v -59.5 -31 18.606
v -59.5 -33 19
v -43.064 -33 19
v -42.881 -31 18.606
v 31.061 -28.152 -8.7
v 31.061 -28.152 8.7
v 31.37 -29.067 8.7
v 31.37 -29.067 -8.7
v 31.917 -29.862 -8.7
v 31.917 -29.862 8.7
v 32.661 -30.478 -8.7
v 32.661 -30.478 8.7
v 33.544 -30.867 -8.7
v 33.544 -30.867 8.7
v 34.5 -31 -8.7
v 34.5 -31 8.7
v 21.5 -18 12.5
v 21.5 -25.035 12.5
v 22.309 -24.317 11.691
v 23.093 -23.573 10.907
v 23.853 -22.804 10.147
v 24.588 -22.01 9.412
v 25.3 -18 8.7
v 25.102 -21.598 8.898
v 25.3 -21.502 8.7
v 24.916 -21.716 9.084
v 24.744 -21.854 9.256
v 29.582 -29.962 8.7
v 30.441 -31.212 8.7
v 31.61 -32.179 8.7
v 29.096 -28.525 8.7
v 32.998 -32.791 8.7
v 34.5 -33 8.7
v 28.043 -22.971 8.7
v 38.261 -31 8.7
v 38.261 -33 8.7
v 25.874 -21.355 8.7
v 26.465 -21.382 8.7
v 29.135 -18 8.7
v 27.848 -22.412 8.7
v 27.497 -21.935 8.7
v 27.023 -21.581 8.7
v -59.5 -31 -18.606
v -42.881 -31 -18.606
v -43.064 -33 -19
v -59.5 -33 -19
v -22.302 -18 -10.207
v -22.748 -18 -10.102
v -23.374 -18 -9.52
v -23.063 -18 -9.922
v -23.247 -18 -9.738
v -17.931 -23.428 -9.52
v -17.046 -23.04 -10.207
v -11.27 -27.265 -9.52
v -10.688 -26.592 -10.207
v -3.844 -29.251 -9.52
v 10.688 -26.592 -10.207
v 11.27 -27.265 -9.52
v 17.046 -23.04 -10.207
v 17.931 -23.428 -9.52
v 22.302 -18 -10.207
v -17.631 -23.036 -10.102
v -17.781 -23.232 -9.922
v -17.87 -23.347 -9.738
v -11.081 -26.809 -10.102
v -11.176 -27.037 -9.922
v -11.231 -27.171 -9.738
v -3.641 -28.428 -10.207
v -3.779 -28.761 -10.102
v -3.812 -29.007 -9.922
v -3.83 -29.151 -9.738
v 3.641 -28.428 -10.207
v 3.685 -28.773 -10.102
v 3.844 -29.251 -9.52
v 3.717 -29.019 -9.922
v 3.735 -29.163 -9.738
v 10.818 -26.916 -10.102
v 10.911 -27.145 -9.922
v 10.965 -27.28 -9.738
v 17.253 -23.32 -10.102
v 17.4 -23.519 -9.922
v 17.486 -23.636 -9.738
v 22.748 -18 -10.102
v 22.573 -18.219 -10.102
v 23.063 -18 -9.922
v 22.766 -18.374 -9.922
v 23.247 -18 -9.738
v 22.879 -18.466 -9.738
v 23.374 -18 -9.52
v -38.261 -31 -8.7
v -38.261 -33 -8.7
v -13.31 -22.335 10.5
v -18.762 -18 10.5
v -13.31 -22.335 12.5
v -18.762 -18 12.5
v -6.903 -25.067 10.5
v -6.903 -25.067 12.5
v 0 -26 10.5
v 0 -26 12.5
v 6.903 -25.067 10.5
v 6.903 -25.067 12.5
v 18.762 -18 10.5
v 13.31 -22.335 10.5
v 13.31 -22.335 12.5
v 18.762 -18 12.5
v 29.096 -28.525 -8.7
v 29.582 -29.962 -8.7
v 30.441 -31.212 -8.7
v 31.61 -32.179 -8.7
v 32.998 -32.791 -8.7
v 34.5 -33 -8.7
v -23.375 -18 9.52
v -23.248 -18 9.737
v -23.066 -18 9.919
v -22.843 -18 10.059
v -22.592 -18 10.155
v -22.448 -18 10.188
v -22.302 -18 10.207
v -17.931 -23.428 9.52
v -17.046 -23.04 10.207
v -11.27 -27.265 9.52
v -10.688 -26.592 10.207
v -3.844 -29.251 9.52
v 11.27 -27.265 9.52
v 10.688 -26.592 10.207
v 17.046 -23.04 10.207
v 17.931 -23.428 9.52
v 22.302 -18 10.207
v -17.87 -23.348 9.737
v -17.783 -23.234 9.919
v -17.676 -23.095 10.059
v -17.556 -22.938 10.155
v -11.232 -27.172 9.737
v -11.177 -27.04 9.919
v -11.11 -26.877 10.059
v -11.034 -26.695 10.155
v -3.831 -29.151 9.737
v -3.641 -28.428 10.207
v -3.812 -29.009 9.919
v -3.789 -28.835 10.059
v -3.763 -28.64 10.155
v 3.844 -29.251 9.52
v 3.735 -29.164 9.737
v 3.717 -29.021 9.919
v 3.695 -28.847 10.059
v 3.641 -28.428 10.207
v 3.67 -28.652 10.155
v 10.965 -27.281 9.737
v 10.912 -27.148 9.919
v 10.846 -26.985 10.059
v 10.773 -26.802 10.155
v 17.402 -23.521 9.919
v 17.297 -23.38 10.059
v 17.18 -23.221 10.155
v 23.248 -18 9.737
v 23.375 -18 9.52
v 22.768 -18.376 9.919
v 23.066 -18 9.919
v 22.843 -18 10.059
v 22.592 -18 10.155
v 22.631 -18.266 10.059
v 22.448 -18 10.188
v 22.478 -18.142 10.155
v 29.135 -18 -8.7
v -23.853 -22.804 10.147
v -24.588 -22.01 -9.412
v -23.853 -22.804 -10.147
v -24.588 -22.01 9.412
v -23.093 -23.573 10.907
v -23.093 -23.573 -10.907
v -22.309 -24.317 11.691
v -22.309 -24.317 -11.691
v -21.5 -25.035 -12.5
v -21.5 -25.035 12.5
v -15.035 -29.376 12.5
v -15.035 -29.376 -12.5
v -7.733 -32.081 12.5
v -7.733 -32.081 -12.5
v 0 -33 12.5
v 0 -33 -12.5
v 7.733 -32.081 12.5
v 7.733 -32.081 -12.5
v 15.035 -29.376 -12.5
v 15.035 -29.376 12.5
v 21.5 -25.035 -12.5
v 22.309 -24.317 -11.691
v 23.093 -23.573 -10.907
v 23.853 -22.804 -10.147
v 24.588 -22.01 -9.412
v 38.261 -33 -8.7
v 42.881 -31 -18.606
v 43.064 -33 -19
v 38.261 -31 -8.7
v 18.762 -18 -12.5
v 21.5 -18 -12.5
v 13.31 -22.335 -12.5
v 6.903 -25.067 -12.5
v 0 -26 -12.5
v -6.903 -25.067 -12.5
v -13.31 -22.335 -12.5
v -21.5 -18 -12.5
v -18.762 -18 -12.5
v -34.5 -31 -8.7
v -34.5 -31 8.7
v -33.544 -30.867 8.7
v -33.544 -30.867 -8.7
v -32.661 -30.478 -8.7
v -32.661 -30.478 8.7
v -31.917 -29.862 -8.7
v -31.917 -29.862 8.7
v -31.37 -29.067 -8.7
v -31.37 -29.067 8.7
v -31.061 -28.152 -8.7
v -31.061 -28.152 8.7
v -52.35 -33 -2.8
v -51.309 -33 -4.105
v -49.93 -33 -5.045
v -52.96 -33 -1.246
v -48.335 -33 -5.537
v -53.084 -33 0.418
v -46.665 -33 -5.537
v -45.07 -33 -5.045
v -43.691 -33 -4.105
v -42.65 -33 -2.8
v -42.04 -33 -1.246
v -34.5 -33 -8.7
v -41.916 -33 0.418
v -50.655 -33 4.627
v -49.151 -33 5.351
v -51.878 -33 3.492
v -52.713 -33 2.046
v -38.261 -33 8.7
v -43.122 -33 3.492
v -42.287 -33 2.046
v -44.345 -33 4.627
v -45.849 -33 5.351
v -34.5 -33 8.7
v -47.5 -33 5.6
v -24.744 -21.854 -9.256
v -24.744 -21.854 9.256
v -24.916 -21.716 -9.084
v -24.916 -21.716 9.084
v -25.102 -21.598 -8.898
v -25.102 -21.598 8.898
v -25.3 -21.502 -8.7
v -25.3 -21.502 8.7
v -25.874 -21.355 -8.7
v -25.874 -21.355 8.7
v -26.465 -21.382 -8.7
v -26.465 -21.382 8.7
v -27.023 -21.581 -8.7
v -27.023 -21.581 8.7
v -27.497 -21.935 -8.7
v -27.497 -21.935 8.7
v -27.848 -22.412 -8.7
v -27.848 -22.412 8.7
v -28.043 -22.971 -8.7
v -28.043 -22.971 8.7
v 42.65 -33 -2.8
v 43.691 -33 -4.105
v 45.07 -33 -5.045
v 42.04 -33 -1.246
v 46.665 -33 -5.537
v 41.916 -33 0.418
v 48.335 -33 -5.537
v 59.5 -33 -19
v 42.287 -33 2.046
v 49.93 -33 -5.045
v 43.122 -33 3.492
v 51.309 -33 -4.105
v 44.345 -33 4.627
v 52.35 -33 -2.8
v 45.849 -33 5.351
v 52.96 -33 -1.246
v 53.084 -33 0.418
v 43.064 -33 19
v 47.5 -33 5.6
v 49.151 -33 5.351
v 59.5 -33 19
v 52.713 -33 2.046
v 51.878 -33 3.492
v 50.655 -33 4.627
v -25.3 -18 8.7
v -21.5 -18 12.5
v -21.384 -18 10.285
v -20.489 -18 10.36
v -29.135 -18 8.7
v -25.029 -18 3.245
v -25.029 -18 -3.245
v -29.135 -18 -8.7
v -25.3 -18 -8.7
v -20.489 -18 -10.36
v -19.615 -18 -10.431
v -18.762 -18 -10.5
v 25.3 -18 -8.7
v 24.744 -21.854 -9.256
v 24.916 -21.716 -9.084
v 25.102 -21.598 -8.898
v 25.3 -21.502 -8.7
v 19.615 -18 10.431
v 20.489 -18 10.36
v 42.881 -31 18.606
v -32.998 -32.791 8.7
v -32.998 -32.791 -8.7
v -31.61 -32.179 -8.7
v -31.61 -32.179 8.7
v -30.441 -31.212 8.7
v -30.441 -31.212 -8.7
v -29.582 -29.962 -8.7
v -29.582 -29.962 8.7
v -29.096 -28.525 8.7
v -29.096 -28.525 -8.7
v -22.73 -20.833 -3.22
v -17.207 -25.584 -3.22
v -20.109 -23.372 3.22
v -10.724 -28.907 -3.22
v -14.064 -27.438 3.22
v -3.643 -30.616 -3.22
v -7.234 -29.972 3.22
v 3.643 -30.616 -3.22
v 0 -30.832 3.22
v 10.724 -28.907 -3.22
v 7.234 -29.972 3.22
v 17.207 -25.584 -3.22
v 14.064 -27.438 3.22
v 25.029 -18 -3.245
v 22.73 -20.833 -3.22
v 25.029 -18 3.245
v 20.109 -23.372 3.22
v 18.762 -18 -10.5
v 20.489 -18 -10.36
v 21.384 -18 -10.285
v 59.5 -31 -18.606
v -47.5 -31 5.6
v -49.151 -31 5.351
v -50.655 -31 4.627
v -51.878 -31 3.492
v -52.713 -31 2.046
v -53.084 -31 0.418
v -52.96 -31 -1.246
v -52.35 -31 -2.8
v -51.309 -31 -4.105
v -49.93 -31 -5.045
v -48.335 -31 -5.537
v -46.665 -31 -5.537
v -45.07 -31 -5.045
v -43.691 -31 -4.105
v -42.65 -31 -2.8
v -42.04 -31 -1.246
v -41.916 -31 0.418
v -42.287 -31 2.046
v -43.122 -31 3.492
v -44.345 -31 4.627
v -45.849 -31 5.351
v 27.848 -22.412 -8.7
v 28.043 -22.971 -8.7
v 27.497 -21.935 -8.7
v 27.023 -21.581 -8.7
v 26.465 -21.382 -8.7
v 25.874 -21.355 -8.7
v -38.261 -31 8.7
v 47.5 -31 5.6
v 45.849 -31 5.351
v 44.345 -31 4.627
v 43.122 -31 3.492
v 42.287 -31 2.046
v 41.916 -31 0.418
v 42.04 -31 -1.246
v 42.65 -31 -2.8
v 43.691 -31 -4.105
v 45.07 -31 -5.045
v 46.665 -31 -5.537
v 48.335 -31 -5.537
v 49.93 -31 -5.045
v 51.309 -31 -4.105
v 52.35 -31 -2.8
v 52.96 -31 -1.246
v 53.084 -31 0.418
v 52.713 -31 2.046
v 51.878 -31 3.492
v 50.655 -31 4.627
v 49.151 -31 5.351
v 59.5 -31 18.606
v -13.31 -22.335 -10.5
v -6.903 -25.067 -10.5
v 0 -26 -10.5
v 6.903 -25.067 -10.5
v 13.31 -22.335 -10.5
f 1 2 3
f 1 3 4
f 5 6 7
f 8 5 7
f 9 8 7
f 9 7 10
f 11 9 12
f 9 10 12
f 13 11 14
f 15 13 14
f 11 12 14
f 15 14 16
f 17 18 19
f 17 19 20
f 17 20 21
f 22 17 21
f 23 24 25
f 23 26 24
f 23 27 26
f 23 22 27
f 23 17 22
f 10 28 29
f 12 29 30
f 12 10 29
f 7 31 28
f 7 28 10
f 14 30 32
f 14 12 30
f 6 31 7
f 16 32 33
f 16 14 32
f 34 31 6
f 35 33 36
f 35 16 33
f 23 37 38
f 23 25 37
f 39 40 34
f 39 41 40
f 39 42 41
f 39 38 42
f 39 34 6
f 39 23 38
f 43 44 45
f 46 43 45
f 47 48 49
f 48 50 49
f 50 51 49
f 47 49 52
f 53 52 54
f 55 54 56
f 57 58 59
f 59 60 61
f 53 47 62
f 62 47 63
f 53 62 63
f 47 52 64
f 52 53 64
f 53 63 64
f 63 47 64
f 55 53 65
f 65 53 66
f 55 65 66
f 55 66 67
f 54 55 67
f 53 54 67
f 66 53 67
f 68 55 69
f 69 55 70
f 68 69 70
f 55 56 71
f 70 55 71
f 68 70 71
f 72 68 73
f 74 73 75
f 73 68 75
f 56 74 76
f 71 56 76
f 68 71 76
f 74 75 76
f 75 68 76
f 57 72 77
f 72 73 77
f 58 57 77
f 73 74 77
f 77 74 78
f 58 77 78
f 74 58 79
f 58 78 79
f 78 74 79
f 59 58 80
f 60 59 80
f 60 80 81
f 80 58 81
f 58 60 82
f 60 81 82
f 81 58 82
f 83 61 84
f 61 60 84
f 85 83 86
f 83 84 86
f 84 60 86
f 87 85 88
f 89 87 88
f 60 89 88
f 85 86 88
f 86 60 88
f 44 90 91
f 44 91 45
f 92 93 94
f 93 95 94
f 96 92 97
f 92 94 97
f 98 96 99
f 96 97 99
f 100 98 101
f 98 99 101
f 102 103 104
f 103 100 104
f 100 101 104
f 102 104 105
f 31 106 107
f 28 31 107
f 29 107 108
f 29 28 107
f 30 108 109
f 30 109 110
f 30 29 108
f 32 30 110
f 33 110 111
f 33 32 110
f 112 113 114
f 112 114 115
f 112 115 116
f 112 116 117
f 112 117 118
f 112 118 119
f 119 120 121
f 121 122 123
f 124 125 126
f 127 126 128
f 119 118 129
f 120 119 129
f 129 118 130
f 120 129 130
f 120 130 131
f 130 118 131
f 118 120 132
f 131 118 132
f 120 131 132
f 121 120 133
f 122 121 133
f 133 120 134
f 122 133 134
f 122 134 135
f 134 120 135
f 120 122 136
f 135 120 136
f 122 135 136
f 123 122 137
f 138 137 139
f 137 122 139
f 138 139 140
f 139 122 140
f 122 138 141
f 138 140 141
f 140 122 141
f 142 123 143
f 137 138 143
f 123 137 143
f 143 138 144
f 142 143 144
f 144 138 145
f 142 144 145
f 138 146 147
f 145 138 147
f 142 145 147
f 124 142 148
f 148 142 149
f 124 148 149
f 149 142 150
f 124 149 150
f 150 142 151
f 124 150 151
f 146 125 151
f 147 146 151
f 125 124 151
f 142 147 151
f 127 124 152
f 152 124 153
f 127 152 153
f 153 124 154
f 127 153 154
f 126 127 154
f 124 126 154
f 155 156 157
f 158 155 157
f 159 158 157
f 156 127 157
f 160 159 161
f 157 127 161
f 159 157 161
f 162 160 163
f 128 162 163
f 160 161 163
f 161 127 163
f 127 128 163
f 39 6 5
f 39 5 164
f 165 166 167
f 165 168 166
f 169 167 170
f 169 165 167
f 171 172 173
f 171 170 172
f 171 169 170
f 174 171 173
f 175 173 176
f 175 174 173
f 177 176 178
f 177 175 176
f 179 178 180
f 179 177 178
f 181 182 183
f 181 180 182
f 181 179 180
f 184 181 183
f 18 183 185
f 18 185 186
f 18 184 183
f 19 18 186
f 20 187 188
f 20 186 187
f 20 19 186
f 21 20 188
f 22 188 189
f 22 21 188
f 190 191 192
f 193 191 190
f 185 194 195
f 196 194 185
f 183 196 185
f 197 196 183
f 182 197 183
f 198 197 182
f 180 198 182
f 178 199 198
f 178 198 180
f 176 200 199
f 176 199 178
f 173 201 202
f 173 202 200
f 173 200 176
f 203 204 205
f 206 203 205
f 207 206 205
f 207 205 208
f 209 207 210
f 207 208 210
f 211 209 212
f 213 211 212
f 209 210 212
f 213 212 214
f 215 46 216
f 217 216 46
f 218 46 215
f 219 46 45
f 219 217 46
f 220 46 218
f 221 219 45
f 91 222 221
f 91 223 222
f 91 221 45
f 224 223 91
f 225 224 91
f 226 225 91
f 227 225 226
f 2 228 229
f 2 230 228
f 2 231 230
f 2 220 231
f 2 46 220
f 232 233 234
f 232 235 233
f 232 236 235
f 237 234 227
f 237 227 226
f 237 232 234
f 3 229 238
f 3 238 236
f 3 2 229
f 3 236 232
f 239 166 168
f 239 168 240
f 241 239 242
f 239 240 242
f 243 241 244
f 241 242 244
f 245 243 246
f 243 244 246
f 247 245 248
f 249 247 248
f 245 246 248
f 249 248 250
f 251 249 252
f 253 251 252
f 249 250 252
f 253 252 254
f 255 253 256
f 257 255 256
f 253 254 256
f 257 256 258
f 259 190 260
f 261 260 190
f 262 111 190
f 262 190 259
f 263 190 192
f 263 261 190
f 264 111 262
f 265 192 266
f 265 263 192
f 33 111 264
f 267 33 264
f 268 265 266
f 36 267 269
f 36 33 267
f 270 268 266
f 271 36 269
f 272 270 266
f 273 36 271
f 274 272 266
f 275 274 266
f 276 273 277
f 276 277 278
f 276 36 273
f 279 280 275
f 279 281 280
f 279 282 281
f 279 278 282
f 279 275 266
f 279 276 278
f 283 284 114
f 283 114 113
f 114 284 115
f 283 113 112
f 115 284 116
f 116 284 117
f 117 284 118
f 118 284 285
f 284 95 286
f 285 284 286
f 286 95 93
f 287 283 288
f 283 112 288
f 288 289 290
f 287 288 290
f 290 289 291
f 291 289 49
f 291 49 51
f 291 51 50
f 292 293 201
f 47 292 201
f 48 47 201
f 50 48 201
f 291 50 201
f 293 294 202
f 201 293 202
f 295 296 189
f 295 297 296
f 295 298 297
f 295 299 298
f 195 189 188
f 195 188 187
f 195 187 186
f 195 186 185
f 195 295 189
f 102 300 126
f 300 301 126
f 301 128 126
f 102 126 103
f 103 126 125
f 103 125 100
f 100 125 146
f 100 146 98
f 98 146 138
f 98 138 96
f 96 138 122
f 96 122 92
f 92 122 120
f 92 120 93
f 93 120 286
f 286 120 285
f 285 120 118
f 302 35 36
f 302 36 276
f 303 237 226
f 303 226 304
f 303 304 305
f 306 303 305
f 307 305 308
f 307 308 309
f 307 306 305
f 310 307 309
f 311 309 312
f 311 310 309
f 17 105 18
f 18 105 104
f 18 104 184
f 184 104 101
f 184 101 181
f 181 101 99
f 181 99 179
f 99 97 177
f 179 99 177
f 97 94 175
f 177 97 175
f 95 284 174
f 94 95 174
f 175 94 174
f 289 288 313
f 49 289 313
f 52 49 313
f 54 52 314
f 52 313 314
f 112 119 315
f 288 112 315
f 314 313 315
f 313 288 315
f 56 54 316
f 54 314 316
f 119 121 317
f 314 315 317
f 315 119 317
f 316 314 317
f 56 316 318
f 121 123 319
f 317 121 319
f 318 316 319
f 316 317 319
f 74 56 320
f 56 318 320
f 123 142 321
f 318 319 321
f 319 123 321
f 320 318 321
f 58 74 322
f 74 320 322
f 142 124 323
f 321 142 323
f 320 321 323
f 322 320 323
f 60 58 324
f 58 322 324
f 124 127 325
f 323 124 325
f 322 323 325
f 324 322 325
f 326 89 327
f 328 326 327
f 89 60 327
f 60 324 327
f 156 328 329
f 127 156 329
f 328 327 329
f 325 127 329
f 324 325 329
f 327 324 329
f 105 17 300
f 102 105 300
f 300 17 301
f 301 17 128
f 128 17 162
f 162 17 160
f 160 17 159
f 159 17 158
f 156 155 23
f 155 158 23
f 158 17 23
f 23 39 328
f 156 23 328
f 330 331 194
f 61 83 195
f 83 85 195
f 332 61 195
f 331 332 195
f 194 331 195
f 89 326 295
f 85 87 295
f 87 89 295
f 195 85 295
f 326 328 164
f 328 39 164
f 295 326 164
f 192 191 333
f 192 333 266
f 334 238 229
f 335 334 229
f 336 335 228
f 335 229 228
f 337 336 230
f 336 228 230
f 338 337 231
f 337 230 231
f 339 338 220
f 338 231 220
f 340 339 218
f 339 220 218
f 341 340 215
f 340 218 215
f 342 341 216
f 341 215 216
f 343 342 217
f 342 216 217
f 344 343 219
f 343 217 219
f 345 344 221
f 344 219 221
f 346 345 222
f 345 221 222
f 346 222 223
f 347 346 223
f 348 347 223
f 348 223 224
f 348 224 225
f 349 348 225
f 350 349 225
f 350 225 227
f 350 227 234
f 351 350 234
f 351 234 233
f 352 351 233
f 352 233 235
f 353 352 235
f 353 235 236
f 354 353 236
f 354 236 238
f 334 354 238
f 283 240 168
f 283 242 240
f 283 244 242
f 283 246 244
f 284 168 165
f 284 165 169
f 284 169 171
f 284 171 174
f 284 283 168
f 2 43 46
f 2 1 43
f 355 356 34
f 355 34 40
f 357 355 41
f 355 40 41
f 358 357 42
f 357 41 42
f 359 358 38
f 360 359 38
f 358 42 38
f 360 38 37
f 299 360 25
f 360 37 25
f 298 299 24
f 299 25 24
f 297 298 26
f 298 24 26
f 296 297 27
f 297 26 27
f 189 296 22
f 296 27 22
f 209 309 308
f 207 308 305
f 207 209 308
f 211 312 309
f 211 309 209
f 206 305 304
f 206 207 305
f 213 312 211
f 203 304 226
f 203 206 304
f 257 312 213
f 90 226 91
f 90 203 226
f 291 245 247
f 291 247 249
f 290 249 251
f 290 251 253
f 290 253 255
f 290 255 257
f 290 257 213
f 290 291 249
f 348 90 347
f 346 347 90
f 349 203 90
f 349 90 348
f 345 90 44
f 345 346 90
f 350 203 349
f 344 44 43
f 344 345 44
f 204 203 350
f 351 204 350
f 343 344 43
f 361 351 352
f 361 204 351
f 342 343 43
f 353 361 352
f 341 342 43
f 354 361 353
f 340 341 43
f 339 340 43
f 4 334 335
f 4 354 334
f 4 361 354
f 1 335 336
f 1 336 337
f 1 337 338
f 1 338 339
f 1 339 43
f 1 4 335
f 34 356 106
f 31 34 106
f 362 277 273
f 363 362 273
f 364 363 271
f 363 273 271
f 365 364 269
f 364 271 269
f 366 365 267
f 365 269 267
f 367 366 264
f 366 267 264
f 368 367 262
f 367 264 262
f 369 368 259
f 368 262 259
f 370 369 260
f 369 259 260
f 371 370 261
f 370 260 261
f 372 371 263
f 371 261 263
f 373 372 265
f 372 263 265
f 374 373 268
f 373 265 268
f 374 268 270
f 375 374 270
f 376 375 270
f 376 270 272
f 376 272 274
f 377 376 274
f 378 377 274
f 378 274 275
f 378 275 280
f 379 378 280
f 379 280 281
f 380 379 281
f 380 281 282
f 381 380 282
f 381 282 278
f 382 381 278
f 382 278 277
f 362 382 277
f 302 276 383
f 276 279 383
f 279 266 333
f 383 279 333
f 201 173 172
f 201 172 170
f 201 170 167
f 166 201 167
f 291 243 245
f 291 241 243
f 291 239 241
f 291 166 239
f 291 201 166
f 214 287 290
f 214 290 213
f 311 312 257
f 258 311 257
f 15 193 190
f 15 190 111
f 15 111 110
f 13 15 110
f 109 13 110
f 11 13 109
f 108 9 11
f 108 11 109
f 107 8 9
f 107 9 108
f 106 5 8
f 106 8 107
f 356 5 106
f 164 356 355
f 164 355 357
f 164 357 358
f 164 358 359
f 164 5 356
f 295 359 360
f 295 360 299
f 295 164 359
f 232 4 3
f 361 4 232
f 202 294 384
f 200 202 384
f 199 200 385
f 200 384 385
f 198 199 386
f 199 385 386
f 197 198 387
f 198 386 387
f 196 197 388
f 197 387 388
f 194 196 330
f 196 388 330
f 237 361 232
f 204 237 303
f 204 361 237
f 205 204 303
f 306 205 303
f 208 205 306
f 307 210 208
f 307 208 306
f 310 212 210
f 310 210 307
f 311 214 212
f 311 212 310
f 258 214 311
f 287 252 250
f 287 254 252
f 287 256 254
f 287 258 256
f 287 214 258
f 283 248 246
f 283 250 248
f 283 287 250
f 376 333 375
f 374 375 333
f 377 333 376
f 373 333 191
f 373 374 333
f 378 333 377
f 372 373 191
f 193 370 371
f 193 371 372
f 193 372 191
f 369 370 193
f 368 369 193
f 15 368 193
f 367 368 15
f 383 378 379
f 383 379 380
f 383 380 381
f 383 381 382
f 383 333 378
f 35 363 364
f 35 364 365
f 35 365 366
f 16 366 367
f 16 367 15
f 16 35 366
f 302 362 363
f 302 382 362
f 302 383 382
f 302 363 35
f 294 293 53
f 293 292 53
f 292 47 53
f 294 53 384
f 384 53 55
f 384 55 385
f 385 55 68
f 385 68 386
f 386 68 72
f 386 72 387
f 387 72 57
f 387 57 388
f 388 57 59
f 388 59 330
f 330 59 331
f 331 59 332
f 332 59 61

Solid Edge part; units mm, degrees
sketch "Sketch1" plane through (0, 0, 0) normal (0, 0, 1) x (1, 0, 0)
  line L0 (-59.5, -31) -> (-59.5, -33)
  line L1 (-59.5, -33) -> (-34.5, -33)
  arc A0 (-34.5, -33) -> (-29.0964, -28.5251) centre (-34.5, -27.5) ccw
  line L2 (-29.0964, -28.5251) -> (-28.0428, -22.9713)
  arc A1 (-28.0428, -22.9713) -> (-24.5877, -22.0101) centre (-26.0779, -23.3441) cw
  arc A2 (-24.5877, -22.0101) -> (24.5877, -22.0101) centre (0, 0) ccw
  arc A3 (24.5877, -22.0101) -> (28.0428, -22.9713) centre (26.0779, -23.3441) cw
  line L3 (28.0428, -22.9713) -> (29.0964, -28.5251)
  arc A4 (29.0964, -28.5251) -> (34.5, -33) centre (34.5, -27.5) ccw
  line L4 (34.5, -33) -> (59.5, -33)
  line L5 (59.5, -33) -> (59.5, -31)
  line L6 (59.5, -31) -> (34.5, -31)
  arc A5 (34.5, -31) -> (31.0613, -28.1523) centre (34.5, -27.5) cw
  line L7 (31.0613, -28.1523) -> (28.2379, -13.2688)
  arc A6 (28.2379, -13.2688) -> (-28.2379, -13.2688) centre (0, 0) cw
  line L8 (-28.2379, -13.2688) -> (-31.0613, -28.1523)
  arc A7 (-31.0613, -28.1523) -> (-34.5, -31) centre (-34.5, -27.5) cw
  line L9 (-34.5, -31) -> (-59.5, -31)
extrude "ExtrudedProtrusion_1" add sketch "Sketch1" against normal blind 19 and the other way blind 19
sketch "Sketch2" plane through (0, 0, 0) normal (1, 0, 0) x (0, 1, 0)
  line L0 (-33, 19) -> (0, 12.5)
  line L1 (0, 12.5) -> (33, 12.5)
  line L2 (33, 12.5) -> (33, -12.5)
  line L3 (33, -12.5) -> (0, -12.5)
  line L4 (0, -12.5) -> (-33, -19)
  line L5 (-33, -19) -> (34, -19)
  line L6 (34, -19) -> (34, 19)
  line L7 (34, 19) -> (-33, 19)
extrude "ExtrudedCutout_1" cut sketch "Sketch2" against normal blind 59.5 and the other way blind 59.5
hole "Hole_1" at (47.5, 0, 0) direction (0, -1, 0) diameter 11.2 depth 33
hole "Hole_2" at (-47.5, 0, 0) direction (0, -1, 0) diameter 11.2 depth 33
sketch "Sketch3" plane through (0, 0, 0) normal (1, 0, 0) x (0, 1, 0)
  line L0 (-26, 12.5) -> (-31.35, 12.5)
  line L1 (-31.35, 12.5) -> (-31.35, -12.5)
  line L2 (-31.35, -12.5) -> (-26, -12.5)
  line L3 (-26, -12.5) -> (-26, -10.5)
  line L4 (-26, -10.5) -> (-28.6598, -10.207)
  arc A0 (-28.6598, -10.207) -> (-29.502, -9.5201) centre (-28.5503, -9.213) cw
  arc A1 (-29.502, -9.5201) -> (-29.502, 9.5201) centre (0, 0) cw
  arc A2 (-29.502, 9.5201) -> (-28.6598, 10.207) centre (-28.5503, 9.213) cw
  line L5 (-28.6598, 10.207) -> (-26, 10.5)
  line L6 (-26, 10.5) -> (-26, 12.5)
revolve "RevolvedProtrusion1" add sketch "Sketch3" angle 360 about axis through (0, 0, 19) along (0, 0, -1)
sketch "Sketch4" plane through (0, 0, 0) normal (1, 0, 0) x (0, 1, 0)
  line L0 (48, 38) -> (-18, 38)
  line L1 (-18, 38) -> (-18, -38)
  line L2 (-18, -38) -> (48, -38)
  line L3 (48, -38) -> (48, 38)
extrude "ExtrudedCutout_2" cut sketch "Sketch4" against normal blind 119 and the other way blind 119
sketch "Sketch5" plane through (0, 0, 0) normal (0, -1, 0) x (1, 0, 0)
  line L0 (-69.5, 29) -> (69.5, 29)
  line L1 (69.5, 29) -> (69.5, -29)
  line L2 (69.5, -29) -> (-69.5, -29)
  line L3 (-69.5, -29) -> (-69.5, 29)
  line L4 (-59.5, -19) -> (-59.5, 19)
  line L5 (-59.5, 19) -> (-43.0643, 19)
  line L6 (-43.0643, 19) -> (-38.2614, 8.7)
  line L7 (-38.2614, 8.7) -> (-25.3, 8.7)
  line L8 (-25.3, 8.7) -> (-21.5, 12.5)
  line L9 (-21.5, 12.5) -> (21.5, 12.5)
  line L10 (21.5, 12.5) -> (25.3, 8.7)
  line L11 (25.3, 8.7) -> (38.2614, 8.7)
  line L12 (38.2614, 8.7) -> (43.0643, 19)
  line L13 (43.0643, 19) -> (59.5, 19)
  line L14 (59.5, 19) -> (59.5, -19)
  line L15 (59.5, -19) -> (43.0643, -19)
  line L16 (43.0643, -19) -> (38.2614, -8.7)
  line L17 (38.2614, -8.7) -> (25.3, -8.7)
  line L18 (25.3, -8.7) -> (21.5, -12.5)
  line L19 (21.5, -12.5) -> (-21.5, -12.5)
  line L20 (-21.5, -12.5) -> (-25.3, -8.7)
  line L21 (-25.3, -8.7) -> (-38.2614, -8.7)
  line L22 (-38.2614, -8.7) -> (-43.0643, -19)
  line L23 (-43.0643, -19) -> (-59.5, -19)
extrude "ExtrudedCutout_3" cut sketch "Sketch5" along normal blind 33
properties part number "housingP 62-h"
